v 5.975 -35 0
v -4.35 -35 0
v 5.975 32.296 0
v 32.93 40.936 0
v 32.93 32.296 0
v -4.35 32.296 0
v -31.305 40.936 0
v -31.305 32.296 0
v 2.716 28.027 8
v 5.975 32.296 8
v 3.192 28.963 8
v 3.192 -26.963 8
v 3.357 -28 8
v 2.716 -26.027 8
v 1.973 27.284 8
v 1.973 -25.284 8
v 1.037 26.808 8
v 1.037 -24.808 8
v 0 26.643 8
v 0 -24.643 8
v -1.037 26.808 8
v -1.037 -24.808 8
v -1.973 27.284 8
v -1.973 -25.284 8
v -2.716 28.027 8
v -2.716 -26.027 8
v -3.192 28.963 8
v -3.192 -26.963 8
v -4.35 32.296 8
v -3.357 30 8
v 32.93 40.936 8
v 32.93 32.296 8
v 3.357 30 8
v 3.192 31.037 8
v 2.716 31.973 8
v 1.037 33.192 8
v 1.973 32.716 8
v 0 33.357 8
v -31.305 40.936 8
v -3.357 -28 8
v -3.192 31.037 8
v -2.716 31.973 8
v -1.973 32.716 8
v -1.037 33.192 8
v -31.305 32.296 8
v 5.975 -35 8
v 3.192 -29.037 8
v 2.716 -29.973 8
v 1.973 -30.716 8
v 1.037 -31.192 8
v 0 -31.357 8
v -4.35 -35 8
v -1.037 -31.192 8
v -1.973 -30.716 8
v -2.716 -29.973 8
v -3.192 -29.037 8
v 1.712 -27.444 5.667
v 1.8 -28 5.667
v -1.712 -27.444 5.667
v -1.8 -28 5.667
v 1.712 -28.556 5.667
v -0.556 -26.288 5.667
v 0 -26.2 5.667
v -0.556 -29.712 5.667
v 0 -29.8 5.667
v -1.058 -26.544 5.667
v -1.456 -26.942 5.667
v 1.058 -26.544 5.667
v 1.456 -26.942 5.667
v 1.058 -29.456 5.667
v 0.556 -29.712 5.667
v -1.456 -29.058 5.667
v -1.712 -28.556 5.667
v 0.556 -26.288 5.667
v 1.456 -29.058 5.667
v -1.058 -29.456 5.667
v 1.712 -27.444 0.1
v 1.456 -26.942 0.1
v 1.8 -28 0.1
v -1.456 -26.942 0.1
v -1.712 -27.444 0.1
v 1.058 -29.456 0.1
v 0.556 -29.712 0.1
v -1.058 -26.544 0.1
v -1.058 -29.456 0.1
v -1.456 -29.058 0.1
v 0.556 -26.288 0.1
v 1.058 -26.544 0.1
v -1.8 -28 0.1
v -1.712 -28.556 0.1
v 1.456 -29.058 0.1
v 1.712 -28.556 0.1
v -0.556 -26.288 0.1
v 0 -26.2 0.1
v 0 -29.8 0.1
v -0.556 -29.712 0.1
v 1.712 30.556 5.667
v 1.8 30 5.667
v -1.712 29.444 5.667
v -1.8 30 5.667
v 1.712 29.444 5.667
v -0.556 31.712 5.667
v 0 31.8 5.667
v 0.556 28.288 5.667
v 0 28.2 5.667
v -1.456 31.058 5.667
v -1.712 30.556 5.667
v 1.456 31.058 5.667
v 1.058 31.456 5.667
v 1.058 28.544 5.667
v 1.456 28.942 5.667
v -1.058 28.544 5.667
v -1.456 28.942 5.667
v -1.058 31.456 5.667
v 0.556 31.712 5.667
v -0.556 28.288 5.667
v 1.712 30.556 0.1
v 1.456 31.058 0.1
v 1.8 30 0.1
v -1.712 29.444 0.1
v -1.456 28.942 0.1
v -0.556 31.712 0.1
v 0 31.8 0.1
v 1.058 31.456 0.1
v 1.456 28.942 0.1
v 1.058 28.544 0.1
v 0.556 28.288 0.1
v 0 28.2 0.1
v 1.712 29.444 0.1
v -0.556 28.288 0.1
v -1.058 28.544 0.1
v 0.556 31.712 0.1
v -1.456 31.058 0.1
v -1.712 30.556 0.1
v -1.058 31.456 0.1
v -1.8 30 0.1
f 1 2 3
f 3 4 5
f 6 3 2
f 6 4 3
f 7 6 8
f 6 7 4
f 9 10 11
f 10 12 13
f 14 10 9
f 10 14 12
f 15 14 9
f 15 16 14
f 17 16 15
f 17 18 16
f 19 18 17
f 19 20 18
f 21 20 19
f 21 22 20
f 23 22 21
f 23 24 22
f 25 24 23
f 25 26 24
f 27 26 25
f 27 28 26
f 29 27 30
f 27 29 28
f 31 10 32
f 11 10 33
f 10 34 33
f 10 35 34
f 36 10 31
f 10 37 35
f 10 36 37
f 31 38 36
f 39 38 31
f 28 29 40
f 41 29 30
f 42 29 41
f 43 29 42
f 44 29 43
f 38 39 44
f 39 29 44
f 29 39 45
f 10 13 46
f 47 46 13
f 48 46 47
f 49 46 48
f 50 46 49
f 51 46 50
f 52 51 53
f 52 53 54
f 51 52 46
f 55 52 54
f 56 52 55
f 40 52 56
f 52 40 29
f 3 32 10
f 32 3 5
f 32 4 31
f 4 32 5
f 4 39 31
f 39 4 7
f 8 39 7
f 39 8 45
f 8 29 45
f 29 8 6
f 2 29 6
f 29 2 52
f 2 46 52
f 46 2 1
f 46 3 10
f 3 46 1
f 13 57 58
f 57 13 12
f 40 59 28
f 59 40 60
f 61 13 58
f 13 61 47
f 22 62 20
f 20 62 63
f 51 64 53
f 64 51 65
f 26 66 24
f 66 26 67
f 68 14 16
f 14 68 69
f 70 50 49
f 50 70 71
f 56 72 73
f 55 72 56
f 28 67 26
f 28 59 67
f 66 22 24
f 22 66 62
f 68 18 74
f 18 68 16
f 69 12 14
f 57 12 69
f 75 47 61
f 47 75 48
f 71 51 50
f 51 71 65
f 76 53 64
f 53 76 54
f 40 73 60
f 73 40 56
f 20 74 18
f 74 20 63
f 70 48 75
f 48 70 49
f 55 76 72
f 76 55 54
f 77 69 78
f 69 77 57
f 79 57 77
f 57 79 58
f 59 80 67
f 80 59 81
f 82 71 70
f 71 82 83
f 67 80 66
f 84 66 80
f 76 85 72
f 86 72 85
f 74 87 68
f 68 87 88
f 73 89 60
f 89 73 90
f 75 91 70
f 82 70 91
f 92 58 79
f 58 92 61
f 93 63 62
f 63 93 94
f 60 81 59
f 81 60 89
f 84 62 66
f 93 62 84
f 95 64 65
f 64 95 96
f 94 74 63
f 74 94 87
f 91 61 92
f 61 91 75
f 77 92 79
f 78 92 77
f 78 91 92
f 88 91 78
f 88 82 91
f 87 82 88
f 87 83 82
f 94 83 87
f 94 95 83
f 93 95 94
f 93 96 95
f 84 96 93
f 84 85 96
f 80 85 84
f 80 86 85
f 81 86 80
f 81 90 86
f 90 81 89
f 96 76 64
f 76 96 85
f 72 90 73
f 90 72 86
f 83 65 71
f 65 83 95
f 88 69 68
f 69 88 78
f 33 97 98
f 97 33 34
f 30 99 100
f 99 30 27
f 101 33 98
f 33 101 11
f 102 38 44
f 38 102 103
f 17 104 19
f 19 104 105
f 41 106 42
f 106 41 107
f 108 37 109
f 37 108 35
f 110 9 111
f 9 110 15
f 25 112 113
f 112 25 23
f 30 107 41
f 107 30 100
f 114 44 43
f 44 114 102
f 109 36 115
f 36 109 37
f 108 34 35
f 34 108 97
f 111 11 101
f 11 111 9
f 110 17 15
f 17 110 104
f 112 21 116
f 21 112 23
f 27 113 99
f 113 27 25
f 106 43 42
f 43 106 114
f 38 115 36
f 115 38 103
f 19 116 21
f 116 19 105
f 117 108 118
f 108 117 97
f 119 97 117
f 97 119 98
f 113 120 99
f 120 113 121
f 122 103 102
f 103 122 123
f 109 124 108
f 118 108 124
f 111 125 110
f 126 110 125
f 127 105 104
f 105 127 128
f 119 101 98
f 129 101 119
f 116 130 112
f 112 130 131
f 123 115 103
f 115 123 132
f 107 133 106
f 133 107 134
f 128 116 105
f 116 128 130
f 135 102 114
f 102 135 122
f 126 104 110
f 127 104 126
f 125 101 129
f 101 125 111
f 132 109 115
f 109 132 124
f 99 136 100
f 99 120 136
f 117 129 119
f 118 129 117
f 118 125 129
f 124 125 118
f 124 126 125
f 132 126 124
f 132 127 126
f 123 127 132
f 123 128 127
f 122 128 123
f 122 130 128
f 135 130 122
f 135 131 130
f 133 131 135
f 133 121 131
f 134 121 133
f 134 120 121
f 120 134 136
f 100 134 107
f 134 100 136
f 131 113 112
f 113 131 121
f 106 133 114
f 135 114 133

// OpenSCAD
// Street Numbers for 3D printing
// Charles Tilford, 2019
// License: CC BY-NC-SA 4.0
//   https://creativecommons.org/licenses/by-nc-sa/4.0/

char="T";     // The number/letter to print

// Units are in mm, except for height of letter

// How many inches high should letter be?
inchesHigh=3;
// How thick/deep should letter be (mm)?
depth=8;

// Character coordinates just center the letter
charX=-31;    // Character X coord
charY=-35;    // Character Y coord
topScrew=30;  // Top screw Y coord
botScrew=-28; // Bottom screw Y coord
height=8;     // Thickness of character
// Screw dimensions. Default presumes
// #6 sheet metal screw
screwWid=3.6; // Width of screw shaft
screwTop=6.78;// Width of screw head
screwCon=5.08;// Height of head 'cone'

// Font to print in. Your system needs this
// installed, of course. If changed the hole
// positions almost certainly need to be
// changed, and maybe charX/charY.
fName="Open Sans Extrabold";
// https://fonts.google.com/specimen/Open+Sans
// Designer: Steve Matteson

// Thin floor below holes. My printer was
// struggling to have the hole 'border' stick
// to the stage. Just drill/screw thru it.
holeFloor=0.1; 

// ==========================================
// ===== All values below are auto-calculated
// ==========================================

// Scaled values
scaleFactor=inchesHigh / 3;
cX=charX * scaleFactor;
cY=charY * scaleFactor;
tS=topScrew * scaleFactor;
bS=botScrew * scaleFactor;
// Where do we start drawing screw head cone?
oS=depth - (screwCon-.05);

difference() {
  // We use difference() to punch out the screw holes
  // in the character
    
  // The character itself, 8mm thick
  translate([cX,cY,0])
    linear_extrude(height=depth, scale=1)
    text(char, size=(75*scaleFactor),
         $fn=100, font=fName);
    
  // Bottom screw hole
  translate([0,bS,oS]) color("red")
    cylinder(h=screwCon, d2=screwTop,
             d1=0, $fn=20);
   translate([0,bS,holeFloor])
    cylinder(h=20, d=screwWid, $fn=20);
    
  // Top screw hole
  translate([0,tS,oS]) color("red")
    cylinder(h=screwCon, d2=screwTop,
             d1=0, $fn=20);
  translate([0,tS,holeFloor])
    cylinder(h=20, d=screwWid, $fn=20);
}

// Colors are just to aid visualization of
// void spaces. $fn is "featuer number", ie how
// many polygons are devoted to object. The values
// above should be near your printing limit anyway.

// Developed in OpenSCAD
//    https://www.openscad.org/
